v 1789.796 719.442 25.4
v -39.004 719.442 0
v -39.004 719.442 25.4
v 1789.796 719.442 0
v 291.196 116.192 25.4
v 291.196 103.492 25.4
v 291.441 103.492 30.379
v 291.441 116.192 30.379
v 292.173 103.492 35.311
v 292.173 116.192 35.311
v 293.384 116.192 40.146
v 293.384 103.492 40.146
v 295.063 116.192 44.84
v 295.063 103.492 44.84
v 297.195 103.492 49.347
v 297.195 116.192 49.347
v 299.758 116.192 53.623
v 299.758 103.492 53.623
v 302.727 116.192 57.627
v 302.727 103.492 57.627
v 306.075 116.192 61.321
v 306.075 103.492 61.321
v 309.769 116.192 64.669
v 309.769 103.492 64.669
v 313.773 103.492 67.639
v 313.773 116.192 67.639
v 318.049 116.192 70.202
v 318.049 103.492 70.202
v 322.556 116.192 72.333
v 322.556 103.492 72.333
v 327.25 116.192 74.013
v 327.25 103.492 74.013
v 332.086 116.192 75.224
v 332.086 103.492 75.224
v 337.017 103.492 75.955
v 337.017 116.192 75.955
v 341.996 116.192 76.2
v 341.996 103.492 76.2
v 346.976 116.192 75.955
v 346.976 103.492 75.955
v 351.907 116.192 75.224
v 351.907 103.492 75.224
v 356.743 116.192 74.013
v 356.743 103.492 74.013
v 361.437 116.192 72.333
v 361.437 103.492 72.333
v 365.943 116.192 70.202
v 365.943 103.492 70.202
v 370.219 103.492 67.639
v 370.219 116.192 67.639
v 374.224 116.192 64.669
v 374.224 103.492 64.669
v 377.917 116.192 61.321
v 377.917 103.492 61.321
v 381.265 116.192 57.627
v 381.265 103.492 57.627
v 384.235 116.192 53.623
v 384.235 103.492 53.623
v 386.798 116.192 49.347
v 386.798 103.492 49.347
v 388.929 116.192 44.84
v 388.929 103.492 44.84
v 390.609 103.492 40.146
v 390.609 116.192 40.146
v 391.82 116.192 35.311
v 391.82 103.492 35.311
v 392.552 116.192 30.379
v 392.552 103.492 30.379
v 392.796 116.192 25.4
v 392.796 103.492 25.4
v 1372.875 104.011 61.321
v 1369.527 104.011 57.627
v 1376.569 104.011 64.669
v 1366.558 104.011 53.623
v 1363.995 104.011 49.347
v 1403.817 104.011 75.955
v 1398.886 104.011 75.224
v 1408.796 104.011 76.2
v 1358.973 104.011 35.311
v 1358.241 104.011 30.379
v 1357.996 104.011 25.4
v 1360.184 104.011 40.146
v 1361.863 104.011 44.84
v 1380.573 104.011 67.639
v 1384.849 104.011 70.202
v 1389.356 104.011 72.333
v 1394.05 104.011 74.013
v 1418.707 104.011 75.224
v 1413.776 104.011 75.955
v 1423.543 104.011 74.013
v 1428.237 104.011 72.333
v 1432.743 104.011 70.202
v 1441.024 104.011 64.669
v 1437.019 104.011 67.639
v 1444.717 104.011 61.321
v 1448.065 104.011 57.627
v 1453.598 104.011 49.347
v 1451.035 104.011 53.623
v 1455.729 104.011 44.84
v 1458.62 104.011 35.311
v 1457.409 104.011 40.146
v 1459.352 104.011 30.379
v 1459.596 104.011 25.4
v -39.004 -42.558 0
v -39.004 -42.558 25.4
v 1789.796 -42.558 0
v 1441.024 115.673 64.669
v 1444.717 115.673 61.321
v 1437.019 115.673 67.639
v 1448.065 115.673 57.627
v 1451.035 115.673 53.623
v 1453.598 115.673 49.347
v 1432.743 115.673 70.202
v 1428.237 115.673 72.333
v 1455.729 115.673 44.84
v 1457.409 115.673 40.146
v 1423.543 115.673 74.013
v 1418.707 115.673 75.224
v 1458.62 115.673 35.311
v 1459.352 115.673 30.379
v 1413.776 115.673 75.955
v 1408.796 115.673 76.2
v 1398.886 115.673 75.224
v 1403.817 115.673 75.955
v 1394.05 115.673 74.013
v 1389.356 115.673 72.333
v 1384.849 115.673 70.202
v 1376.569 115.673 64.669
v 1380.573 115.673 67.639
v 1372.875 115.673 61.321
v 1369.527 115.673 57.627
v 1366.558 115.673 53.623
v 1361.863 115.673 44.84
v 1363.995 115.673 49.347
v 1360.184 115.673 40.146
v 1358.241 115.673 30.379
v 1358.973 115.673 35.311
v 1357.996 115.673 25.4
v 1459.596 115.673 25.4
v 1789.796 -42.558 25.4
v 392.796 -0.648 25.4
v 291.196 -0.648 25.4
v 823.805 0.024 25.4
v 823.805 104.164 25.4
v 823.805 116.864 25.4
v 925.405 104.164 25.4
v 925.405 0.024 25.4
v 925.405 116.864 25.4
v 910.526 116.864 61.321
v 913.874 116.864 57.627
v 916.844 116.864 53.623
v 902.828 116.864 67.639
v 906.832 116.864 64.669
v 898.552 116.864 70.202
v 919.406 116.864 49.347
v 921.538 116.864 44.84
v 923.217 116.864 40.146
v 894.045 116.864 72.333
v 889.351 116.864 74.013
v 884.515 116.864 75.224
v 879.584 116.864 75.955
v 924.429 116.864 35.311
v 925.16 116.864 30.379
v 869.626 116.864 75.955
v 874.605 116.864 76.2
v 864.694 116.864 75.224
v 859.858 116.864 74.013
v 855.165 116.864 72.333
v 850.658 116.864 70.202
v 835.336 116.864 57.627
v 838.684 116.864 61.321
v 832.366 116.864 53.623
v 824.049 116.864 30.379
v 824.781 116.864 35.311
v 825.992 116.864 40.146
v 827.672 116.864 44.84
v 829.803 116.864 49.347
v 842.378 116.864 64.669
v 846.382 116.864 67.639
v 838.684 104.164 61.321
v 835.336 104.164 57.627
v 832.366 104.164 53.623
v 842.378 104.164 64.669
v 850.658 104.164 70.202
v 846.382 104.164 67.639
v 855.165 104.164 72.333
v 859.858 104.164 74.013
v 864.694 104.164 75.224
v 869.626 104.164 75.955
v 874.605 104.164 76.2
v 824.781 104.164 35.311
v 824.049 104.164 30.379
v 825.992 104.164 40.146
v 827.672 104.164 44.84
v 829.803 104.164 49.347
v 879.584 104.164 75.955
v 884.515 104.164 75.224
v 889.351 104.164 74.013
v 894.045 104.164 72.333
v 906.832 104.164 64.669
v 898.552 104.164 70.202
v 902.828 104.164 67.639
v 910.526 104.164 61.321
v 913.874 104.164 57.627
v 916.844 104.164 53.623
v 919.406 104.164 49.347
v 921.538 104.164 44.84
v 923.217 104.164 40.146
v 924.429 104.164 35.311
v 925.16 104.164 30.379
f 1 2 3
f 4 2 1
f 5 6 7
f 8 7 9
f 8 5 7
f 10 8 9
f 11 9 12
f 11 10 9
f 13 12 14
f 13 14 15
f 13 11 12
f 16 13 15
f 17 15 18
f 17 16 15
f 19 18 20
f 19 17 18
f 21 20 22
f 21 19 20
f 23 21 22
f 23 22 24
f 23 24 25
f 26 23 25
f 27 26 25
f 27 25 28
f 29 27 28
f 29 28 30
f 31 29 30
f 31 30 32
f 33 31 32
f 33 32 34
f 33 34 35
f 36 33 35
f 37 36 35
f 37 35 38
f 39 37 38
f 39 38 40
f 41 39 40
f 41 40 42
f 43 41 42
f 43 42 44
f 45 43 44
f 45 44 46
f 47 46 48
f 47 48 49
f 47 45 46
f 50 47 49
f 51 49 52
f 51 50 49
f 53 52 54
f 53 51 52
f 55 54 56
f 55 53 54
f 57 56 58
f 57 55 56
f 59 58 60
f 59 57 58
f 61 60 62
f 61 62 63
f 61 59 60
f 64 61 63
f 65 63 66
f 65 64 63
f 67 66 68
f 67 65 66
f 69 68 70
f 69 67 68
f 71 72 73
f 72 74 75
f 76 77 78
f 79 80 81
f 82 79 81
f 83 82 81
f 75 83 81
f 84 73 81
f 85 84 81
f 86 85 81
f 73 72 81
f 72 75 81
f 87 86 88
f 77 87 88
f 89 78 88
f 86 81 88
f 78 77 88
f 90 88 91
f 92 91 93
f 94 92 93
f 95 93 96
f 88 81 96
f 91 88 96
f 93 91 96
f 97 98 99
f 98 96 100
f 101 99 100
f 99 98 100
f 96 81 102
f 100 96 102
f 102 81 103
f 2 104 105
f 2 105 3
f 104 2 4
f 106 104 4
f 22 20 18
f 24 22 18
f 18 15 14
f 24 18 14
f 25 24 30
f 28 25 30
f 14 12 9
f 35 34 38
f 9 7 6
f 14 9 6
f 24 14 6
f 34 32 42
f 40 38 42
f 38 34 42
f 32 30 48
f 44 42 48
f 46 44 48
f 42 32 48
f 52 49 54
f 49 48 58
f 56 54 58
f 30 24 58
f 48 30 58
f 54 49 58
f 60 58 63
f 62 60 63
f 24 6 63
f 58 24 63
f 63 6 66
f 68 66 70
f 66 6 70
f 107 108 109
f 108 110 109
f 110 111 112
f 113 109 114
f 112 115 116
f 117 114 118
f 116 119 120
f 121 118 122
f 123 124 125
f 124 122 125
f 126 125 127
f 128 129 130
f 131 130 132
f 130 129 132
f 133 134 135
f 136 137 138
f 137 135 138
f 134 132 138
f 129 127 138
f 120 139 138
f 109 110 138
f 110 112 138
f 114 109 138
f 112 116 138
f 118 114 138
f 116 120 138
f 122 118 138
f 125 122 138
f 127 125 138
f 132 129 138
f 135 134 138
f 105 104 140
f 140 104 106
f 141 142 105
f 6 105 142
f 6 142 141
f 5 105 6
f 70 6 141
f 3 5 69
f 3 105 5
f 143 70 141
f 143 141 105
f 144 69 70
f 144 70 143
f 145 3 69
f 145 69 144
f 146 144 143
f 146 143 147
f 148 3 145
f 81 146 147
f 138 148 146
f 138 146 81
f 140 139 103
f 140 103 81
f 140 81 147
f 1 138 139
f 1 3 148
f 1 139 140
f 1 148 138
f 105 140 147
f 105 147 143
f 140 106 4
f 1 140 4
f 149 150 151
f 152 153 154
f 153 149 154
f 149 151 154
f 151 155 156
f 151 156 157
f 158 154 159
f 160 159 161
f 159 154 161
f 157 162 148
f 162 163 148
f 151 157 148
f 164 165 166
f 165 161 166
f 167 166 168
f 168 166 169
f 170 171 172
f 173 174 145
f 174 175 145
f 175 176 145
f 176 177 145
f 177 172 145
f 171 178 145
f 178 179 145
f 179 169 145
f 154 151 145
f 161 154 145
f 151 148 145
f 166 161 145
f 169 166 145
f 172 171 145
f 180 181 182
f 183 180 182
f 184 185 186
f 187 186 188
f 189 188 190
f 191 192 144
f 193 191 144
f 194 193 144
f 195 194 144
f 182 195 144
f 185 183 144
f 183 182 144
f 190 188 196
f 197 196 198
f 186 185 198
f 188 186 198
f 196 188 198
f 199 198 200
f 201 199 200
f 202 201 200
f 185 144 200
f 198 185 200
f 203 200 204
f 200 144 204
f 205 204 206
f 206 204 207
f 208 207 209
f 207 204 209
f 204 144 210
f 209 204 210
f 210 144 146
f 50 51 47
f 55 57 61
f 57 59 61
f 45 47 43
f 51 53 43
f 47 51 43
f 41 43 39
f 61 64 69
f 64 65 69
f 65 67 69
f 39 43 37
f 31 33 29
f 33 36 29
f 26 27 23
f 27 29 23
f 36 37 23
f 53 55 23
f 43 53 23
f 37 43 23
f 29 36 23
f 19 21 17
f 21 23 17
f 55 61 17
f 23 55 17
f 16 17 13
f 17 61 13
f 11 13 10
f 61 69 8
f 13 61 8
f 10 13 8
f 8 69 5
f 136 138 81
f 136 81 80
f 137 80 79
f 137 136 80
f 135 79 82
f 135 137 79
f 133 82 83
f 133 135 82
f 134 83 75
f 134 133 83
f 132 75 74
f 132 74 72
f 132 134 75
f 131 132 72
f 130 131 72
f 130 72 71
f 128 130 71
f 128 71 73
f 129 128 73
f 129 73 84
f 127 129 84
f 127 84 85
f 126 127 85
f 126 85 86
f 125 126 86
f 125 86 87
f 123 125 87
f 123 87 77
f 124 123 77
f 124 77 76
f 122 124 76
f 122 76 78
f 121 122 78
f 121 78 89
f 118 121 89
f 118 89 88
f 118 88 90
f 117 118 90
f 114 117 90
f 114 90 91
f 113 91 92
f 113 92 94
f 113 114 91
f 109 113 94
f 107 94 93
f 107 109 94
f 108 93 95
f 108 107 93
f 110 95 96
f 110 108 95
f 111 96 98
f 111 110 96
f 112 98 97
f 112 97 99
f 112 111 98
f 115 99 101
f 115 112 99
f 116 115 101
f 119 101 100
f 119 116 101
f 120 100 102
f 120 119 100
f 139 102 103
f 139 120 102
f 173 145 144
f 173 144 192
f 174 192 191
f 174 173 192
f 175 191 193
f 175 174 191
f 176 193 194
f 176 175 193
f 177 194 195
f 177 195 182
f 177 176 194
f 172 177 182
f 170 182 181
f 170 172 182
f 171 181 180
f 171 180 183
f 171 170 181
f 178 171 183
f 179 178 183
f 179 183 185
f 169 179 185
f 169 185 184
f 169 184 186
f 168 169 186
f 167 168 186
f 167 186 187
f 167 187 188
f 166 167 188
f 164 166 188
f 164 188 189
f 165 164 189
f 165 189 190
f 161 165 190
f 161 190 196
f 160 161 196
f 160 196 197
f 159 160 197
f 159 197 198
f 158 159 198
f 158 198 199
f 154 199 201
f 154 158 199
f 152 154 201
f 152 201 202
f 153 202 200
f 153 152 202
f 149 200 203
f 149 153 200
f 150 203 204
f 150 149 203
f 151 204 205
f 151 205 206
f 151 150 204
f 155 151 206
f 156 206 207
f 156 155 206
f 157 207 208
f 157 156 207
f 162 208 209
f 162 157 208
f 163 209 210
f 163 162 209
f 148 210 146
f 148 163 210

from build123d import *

# Parameters (mm, degrees)
SKETCH1_W           = 1828.8
SKETCH1_H           = 762
BOSS_EXTRUDE1_DEPTH = 25.4
BOSS_EXTRUDE2_DEPTH = 76.2
CUT_EXTRUDE2_DEPTH  = 1892.621171867
CUT_EXTRUDE3_DEPTH  = 116.84
CUT_EXTRUDE4_DEPTH  = 116.84


with BuildPart() as part:
    # Sketch1 → Boss-Extrude1 (new body)
    with BuildSketch(Plane.XY):
        with Locations((875.396405659, 338.441890904)):
            Rectangle(SKETCH1_W, SKETCH1_H)
    extrude(amount=BOSS_EXTRUDE1_DEPTH)

    # Sketch4 → Boss-Extrude2 (add)
    with BuildSketch(Plane.XY.offset(25.4)):
        Polygon((341.996405659, 116.191890904), (291.196405659, 116.191890904), (291.196405659, 103.491890904), (392.796405659, 103.491890904), (392.796405659, 116.191890904), align=None)
        Polygon((874.604865323, 116.863799968), (823.804865323, 116.863799968), (823.804865323, 104.163799968), (925.404865323, 104.163799968), (925.404865323, 116.863799968), align=None)
        Polygon((1408.796405659, 115.67295816), (1357.996405659, 115.67295816), (1357.996405659, 104.010823647), (1459.596405659, 104.010823647), (1459.596405659, 115.67295816), align=None)
    extrude(amount=BOSS_EXTRUDE2_DEPTH)

    # Sketch6 → Cut-Extrude2 (cut, through all)
    with BuildSketch(Plane(origin=(0, 115.67295816, 0), x_dir=(1, 0, 0), z_dir=(0, 1, 0))):
        with BuildLine():
            Line((1459.596405659, -25.4), (1459.596405659, -101.6))
            Line((1459.596405659, -101.6), (1357.996405659, -101.6))
            Line((1357.996405659, -101.6), (1357.996405659, -25.4))
            ThreePointArc((1357.996405659, -25.4), (1408.796405659, -76.2), (1459.596405659, -25.4))
        make_face()
    extrude(amount=-CUT_EXTRUDE2_DEPTH, mode=Mode.SUBTRACT)

    # Sketch7 → Cut-Extrude3 (cut)
    with BuildSketch(Plane(origin=(0, 116.863799968, 0), x_dir=(1, 0, 0), z_dir=(0, 1, 0))):
        with BuildLine():
            Line((925.404865323, -25.4), (925.404865323, -101.6))
            Line((925.404865323, -101.6), (823.804865323, -101.6))
            Line((823.804865323, -101.6), (823.804865323, -25.4))
            ThreePointArc((823.804865323, -25.4), (874.604865323, -76.2), (925.404865323, -25.4))
        make_face()
    extrude(amount=-CUT_EXTRUDE3_DEPTH, mode=Mode.SUBTRACT)

    # Sketch8 → Cut-Extrude4 (cut)
    with BuildSketch(Plane(origin=(0, 116.191890904, 0), x_dir=(1, 0, 0), z_dir=(0, 1, 0))):
        with BuildLine():
            Line((392.796405659, -25.4), (392.796405659, -101.6))
            Line((392.796405659, -101.6), (291.196405659, -101.6))
            Line((291.196405659, -101.6), (291.196405659, -25.4))
            ThreePointArc((291.196405659, -25.4), (341.996405659, -76.2), (392.796405659, -25.4))
        make_face()
    extrude(amount=-CUT_EXTRUDE4_DEPTH, mode=Mode.SUBTRACT)


solid = part.part
